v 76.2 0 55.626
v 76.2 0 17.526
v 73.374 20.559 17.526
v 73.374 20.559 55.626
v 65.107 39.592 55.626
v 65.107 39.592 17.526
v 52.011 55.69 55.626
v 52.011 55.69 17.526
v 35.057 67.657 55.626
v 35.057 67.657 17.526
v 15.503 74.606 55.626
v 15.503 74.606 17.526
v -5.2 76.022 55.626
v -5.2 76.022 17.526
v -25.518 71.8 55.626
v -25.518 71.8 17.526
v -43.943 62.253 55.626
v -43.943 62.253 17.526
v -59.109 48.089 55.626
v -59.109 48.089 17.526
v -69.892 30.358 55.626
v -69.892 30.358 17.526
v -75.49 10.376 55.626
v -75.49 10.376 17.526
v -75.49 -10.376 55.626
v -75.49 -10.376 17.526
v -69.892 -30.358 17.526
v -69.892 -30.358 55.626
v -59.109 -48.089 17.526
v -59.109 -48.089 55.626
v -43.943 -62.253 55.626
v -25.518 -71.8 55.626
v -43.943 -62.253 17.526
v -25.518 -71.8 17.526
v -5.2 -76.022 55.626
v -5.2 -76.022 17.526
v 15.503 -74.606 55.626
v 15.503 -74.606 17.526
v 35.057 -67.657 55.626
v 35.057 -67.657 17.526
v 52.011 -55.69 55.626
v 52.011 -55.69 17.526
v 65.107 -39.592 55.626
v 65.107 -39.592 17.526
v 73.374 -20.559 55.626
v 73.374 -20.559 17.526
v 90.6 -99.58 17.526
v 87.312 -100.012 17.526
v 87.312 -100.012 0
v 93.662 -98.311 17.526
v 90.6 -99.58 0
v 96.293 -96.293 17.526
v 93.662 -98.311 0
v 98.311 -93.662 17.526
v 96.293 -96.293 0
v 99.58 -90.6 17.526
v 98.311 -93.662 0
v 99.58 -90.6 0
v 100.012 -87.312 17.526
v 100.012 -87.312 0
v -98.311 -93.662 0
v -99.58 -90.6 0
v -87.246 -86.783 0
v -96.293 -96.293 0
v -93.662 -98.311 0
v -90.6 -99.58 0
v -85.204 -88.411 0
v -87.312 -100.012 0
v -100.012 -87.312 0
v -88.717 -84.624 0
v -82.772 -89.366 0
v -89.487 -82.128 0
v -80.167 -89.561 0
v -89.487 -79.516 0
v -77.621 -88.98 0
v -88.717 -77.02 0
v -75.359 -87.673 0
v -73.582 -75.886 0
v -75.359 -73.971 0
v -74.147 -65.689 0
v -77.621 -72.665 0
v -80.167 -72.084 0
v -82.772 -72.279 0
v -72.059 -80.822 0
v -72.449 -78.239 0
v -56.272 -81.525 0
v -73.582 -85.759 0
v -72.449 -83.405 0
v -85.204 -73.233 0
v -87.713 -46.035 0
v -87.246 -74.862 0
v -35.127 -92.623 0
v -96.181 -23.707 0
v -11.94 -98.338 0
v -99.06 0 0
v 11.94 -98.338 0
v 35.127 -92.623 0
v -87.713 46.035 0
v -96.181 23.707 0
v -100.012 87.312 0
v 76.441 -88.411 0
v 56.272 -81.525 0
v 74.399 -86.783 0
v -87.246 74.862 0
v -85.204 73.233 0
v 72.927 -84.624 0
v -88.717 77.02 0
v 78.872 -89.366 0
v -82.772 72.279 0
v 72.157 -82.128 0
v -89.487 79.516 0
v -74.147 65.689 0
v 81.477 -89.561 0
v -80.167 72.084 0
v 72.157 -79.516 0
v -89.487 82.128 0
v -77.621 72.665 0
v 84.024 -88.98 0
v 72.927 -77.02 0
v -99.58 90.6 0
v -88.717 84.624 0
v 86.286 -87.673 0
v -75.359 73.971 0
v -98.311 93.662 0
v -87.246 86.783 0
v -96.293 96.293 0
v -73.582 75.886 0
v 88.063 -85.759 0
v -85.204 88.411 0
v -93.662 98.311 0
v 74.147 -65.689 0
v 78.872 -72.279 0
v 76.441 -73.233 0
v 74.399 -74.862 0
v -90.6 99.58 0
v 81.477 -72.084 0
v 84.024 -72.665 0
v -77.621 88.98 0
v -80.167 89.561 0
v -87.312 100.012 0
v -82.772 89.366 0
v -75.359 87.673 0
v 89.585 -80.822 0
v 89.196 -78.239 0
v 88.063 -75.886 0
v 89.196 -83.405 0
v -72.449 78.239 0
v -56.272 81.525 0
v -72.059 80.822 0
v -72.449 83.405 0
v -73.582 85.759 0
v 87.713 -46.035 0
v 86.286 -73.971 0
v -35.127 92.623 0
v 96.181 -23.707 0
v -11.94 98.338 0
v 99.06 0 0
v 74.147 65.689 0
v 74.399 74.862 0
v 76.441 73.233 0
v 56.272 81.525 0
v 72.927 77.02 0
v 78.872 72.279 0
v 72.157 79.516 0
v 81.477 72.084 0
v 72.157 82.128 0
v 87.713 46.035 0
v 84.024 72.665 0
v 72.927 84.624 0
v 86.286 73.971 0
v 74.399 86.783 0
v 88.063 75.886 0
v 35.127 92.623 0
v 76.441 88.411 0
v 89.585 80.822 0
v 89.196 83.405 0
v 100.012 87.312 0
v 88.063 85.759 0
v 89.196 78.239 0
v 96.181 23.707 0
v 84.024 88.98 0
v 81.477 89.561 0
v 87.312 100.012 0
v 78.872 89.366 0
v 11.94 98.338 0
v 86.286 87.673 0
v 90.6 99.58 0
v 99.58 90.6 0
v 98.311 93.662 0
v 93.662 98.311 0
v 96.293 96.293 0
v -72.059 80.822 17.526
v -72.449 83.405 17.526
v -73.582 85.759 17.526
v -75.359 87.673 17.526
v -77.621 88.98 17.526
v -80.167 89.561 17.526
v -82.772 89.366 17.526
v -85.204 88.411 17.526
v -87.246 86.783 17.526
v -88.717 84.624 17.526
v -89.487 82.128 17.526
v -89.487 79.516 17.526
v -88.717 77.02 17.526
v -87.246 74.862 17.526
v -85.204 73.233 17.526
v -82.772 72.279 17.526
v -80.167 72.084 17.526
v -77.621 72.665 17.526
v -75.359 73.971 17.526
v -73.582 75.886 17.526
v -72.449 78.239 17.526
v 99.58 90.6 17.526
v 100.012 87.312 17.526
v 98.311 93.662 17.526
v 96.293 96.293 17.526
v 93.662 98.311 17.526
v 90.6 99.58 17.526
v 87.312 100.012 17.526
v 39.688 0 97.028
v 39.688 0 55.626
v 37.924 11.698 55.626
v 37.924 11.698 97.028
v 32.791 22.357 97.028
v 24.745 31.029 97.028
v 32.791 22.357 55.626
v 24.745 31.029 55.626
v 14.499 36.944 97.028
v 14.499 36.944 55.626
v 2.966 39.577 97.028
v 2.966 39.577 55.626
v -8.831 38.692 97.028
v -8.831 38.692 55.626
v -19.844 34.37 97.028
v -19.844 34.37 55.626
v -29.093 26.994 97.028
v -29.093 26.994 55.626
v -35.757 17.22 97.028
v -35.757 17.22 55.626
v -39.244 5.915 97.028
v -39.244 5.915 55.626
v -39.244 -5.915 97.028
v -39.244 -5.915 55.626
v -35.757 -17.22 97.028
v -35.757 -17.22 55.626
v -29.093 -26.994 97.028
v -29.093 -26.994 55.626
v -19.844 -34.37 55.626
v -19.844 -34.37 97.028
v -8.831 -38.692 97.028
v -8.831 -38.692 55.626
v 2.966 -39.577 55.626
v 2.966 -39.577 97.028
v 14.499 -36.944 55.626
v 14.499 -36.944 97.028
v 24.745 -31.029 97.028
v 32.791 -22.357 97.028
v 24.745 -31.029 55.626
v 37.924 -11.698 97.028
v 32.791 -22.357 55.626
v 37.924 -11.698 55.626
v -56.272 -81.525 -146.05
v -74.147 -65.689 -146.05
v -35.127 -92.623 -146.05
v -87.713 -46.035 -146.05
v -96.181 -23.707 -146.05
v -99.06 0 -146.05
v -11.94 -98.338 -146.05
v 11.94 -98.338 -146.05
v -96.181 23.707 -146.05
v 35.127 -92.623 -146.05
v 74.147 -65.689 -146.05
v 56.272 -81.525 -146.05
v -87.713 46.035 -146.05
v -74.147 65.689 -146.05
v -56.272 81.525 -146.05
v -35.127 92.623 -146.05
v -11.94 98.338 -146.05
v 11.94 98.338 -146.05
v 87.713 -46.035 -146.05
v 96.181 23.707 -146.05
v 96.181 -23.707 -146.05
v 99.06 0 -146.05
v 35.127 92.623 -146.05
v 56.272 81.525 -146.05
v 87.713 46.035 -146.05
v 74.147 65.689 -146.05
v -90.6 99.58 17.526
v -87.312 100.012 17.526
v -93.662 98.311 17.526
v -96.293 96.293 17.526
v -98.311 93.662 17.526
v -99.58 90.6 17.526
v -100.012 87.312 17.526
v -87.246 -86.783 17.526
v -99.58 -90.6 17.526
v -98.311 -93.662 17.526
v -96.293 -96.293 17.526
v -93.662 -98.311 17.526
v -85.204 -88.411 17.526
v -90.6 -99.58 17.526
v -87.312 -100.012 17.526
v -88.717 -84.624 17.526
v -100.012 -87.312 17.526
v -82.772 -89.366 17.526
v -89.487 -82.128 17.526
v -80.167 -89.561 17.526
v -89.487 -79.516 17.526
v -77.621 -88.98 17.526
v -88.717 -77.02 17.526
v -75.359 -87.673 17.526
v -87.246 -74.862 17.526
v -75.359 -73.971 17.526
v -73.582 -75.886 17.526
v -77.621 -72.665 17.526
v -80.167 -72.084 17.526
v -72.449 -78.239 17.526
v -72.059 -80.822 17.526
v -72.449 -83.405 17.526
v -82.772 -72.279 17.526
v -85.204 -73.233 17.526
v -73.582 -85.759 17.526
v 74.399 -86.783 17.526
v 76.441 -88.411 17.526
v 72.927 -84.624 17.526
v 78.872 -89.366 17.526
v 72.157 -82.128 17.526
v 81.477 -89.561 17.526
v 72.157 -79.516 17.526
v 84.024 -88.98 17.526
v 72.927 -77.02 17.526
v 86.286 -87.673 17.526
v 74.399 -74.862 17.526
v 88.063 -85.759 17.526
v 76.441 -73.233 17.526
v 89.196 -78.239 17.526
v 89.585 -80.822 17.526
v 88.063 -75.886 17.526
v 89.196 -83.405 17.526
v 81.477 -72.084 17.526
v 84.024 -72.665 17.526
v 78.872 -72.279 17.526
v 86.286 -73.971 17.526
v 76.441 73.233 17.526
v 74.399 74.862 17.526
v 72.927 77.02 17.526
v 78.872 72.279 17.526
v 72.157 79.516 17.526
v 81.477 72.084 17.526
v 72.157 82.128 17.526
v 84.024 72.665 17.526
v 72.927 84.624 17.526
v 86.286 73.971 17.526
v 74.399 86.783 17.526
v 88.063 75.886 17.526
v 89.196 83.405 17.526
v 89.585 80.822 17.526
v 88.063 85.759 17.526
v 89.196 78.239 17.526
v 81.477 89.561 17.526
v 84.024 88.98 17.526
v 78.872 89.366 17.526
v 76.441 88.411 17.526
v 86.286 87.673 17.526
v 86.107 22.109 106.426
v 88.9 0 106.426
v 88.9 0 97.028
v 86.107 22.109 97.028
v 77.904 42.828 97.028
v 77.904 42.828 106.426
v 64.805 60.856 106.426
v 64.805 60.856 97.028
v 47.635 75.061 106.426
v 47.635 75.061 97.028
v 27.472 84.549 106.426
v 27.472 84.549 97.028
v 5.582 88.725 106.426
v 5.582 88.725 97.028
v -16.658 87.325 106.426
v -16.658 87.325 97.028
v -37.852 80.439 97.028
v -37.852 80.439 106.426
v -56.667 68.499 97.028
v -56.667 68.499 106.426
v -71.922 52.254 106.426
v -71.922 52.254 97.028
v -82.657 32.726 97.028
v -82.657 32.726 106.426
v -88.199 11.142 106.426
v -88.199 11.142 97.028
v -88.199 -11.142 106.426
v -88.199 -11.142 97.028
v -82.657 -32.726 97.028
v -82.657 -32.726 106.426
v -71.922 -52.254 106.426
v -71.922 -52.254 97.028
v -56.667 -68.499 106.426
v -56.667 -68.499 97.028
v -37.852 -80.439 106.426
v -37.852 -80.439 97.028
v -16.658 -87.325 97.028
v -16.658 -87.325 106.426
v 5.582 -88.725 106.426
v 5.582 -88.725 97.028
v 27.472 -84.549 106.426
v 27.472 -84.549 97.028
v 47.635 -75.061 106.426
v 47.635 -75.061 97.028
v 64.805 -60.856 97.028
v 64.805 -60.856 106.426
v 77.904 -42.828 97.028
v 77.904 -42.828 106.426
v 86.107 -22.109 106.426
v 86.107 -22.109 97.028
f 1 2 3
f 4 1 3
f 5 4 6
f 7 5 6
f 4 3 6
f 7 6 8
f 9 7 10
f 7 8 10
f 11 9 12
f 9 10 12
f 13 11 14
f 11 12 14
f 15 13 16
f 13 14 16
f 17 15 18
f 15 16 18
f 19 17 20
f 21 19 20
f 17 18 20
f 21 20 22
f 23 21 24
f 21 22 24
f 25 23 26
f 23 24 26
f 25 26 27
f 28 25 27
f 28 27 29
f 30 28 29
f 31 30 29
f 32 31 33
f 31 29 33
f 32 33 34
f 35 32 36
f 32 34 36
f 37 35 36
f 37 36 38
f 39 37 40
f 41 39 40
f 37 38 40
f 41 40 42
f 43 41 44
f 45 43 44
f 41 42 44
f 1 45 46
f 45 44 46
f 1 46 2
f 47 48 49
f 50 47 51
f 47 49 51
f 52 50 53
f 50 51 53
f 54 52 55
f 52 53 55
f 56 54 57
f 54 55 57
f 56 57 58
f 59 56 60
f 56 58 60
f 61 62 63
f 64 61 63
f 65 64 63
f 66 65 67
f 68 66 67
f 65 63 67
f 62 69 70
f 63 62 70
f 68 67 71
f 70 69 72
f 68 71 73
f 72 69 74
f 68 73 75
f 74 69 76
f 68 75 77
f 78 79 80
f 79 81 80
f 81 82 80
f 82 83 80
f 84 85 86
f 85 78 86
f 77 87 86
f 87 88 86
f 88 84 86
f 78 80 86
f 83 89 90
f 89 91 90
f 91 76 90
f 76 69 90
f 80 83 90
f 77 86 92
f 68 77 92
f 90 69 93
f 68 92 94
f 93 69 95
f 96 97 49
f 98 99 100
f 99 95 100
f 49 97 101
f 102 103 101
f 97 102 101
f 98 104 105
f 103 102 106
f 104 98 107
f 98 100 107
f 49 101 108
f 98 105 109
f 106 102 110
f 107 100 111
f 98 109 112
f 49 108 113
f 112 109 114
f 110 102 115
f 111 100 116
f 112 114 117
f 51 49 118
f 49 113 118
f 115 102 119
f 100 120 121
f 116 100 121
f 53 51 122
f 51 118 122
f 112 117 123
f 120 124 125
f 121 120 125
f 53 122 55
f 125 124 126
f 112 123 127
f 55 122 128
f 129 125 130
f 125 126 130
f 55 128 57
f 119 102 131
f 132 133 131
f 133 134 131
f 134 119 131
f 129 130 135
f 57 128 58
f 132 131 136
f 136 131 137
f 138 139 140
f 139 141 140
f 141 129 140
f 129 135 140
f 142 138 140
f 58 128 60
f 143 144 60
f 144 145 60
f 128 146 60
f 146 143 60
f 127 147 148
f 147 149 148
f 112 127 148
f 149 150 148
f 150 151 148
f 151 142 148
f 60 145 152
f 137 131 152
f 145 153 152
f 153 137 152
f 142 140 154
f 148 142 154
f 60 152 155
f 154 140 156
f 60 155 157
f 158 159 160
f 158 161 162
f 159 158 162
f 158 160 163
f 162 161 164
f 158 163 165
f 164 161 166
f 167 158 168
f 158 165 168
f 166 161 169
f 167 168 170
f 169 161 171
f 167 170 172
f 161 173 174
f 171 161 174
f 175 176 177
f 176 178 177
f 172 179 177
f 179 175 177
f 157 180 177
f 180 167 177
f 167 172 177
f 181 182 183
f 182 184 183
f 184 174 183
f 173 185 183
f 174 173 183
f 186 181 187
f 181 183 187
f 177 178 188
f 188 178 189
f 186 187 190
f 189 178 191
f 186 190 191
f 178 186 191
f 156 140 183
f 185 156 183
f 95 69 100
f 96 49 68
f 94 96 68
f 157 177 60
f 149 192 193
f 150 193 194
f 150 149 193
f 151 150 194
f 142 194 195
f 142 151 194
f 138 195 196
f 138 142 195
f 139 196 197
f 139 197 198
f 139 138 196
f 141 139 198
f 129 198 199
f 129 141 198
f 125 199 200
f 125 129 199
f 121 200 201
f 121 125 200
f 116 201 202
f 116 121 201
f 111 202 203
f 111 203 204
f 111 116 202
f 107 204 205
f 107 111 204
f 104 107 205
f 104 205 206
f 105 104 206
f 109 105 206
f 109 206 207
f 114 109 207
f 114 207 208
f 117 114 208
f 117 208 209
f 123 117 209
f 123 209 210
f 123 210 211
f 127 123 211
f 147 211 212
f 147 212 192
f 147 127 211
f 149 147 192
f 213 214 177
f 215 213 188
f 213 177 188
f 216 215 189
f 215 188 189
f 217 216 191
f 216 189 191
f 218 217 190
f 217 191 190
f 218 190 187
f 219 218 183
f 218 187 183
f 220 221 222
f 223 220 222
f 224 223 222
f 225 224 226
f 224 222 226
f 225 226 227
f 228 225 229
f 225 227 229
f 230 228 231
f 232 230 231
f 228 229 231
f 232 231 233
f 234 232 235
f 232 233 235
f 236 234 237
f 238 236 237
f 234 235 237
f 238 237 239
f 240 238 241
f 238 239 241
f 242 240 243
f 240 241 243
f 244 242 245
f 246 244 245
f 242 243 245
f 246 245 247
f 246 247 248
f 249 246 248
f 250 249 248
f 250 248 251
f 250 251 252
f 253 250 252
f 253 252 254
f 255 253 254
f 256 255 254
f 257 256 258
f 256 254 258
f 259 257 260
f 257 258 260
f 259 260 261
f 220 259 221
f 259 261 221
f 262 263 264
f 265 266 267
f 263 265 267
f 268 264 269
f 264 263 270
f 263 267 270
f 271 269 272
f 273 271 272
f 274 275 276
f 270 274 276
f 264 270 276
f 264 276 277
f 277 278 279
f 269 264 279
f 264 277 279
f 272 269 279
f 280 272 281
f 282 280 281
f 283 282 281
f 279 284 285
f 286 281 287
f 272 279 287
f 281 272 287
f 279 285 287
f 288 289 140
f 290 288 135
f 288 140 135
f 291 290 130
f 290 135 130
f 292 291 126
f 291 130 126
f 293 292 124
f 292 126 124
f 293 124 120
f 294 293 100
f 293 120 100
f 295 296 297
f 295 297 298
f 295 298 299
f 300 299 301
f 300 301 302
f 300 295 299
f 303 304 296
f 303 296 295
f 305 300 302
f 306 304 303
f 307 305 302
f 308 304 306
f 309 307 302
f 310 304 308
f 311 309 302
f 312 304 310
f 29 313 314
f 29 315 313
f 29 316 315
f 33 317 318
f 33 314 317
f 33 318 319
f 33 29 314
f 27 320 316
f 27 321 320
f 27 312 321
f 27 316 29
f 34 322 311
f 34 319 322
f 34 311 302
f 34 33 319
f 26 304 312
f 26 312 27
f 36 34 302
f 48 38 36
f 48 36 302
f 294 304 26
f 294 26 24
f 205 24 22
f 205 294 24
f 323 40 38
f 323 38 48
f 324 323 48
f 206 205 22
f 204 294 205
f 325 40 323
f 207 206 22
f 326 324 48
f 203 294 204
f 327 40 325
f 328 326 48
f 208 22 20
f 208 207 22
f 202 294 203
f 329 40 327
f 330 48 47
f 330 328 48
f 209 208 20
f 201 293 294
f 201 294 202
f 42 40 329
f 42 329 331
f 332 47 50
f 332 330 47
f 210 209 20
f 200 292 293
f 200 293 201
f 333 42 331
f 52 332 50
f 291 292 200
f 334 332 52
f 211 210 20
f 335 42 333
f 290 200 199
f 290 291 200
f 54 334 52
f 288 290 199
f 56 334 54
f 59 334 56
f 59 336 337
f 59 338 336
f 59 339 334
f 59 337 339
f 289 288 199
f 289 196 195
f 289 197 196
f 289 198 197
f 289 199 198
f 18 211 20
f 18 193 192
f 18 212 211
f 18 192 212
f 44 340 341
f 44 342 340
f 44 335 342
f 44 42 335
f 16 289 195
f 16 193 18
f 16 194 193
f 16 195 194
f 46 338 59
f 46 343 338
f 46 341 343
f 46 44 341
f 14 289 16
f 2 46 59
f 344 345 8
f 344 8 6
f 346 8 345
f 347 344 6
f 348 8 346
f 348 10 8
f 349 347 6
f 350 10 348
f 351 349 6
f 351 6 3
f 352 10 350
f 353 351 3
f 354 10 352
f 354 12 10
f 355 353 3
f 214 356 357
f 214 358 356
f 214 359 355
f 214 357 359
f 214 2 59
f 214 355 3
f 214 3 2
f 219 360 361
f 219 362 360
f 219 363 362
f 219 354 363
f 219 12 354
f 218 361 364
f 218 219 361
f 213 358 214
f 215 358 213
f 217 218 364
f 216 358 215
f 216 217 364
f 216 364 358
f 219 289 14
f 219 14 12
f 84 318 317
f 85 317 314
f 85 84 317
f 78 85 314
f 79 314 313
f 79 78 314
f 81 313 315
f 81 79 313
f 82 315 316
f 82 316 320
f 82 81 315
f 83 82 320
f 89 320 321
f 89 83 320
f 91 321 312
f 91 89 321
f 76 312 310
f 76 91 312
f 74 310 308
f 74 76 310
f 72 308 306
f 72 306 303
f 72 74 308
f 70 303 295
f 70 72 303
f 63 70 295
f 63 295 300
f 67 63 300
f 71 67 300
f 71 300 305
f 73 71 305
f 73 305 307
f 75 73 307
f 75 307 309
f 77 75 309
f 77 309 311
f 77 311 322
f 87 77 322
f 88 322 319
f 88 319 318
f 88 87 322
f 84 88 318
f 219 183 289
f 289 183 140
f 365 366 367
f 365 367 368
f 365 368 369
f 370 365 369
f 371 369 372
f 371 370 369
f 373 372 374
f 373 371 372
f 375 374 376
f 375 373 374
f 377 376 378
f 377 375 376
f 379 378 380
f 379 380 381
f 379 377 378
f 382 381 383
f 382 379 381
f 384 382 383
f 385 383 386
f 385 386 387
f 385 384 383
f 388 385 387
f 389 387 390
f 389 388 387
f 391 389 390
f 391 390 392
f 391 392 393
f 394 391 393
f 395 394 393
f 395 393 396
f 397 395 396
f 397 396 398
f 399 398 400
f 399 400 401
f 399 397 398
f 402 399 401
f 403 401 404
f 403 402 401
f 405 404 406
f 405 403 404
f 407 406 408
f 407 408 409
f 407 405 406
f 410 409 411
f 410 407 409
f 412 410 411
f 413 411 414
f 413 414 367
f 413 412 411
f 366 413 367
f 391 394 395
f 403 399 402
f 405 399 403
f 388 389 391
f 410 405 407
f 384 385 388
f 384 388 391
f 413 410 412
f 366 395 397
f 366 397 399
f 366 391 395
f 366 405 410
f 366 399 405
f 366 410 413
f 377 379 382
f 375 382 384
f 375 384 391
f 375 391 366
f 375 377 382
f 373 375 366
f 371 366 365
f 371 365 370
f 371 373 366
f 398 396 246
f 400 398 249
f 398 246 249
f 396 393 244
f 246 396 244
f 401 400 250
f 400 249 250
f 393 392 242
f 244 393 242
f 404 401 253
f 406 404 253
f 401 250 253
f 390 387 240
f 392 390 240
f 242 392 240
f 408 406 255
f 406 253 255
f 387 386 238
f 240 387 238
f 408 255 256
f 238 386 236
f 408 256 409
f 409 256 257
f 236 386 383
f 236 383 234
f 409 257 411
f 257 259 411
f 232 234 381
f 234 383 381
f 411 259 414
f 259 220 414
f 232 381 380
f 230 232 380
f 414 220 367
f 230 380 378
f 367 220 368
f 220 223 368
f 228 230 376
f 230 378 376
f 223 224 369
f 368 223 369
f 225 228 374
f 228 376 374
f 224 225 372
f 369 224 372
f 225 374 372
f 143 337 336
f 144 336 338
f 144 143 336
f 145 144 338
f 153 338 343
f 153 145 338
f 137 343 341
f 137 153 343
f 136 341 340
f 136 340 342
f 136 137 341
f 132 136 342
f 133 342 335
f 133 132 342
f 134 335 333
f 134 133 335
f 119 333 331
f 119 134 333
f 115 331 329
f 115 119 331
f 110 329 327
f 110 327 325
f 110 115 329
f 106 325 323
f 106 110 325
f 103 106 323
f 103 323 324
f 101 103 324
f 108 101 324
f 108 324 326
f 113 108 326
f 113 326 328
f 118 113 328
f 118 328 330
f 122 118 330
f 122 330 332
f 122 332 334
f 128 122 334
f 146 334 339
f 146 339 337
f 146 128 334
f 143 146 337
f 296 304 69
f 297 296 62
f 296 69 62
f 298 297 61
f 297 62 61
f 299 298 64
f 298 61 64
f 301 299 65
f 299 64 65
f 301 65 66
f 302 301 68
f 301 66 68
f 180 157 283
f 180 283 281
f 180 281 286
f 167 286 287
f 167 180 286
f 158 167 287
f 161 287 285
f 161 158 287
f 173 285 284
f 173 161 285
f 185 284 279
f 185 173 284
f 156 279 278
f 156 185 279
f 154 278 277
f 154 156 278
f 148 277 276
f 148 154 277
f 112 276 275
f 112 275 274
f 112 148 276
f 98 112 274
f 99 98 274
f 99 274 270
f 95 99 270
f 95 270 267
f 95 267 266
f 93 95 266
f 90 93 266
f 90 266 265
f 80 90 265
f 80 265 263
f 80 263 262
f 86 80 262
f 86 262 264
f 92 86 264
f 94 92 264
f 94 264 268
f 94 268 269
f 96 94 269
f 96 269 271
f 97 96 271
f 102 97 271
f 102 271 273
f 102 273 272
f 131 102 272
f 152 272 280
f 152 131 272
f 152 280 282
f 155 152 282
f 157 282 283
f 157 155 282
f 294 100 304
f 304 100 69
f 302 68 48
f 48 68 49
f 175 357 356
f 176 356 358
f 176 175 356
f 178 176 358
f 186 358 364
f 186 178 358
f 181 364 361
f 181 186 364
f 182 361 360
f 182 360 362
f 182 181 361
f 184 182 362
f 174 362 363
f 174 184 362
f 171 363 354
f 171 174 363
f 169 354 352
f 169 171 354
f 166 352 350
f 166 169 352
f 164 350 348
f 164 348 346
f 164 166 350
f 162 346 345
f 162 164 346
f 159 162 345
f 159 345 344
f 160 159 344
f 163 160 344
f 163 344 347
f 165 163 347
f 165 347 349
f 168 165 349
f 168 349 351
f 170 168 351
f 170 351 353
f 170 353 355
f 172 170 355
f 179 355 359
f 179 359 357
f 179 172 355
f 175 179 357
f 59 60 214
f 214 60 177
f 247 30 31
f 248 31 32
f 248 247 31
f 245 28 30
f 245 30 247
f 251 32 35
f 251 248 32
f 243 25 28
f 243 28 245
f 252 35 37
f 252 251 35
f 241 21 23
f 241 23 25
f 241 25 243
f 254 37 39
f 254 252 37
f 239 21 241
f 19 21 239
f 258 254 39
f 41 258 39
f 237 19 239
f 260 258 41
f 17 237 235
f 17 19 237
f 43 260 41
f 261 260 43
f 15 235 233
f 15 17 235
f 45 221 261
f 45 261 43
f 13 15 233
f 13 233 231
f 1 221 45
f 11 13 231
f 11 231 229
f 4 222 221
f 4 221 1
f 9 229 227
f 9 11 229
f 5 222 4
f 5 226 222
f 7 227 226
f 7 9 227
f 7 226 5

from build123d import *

# Parameters (mm, degrees)
F0_R      = 8.763
F1_DEPTH  = 17.526
F2_R      = 99.06
F3_DEPTH  = 163.576
F4_R      = 76.2
F5_DEPTH  = 38.1
F6_R      = 39.6875
F7_DEPTH  = 41.402
F9_R      = 88.9
F10_DEPTH = 9.398


with BuildPart() as f1:
    # F0 (on Top) → F1 (new body)
    with BuildSketch(Plane.XY):
        with BuildLine():
            Line((87.3125, 100.0125), (-87.3125, 100.0125))
            ThreePointArc((-87.3125, 100.0125), (-96.292756, 96.292756), (-100.0125, 87.3125))
            Line((-100.0125, 87.3125), (-100.0125, -87.3125))
            ThreePointArc((-100.0125, -87.3125), (-96.292756, -96.292756), (-87.3125, -100.0125))
            Line((-87.3125, -100.0125), (87.3125, -100.0125))
            ThreePointArc((87.3125, -100.0125), (96.292756, -96.292756), (100.0125, -87.3125))
            Line((100.0125, -87.3125), (100.0125, 87.3125))
            ThreePointArc((100.0125, 87.3125), (96.292756, 96.292756), (87.3125, 100.0125))
        make_face()
        with Locations((-80.822305, -80.822305)):
            Circle(F0_R, mode=Mode.SUBTRACT)
        with Locations((80.822305, -80.822305)):
            Circle(F0_R, mode=Mode.SUBTRACT)
        with Locations((-80.822305, 80.822305)):
            Circle(F0_R, mode=Mode.SUBTRACT)
        with Locations((80.822305, 80.822305)):
            Circle(F0_R, mode=Mode.SUBTRACT)
    extrude(amount=F1_DEPTH)

    # F2 (on face) → F3 (join)
    with BuildSketch(Plane.XY.offset(17.526)):
        Circle(F2_R)
    extrude(amount=-F3_DEPTH)

    # F4 (on face) → F5 (join)
    with BuildSketch(Plane.XY.offset(17.526)):
        Circle(F4_R)
    extrude(amount=F5_DEPTH)

    # F6 (on face) → F7 (join)
    with BuildSketch(Plane.XY.offset(55.626)):
        Circle(F6_R)
    extrude(amount=F7_DEPTH)

    # F9 (on offset) → F10 (join, through all)
    with BuildSketch(Plane.XY.offset(106.426)):
        Circle(F9_R)
    extrude(amount=-F10_DEPTH)


solid = f1.part
